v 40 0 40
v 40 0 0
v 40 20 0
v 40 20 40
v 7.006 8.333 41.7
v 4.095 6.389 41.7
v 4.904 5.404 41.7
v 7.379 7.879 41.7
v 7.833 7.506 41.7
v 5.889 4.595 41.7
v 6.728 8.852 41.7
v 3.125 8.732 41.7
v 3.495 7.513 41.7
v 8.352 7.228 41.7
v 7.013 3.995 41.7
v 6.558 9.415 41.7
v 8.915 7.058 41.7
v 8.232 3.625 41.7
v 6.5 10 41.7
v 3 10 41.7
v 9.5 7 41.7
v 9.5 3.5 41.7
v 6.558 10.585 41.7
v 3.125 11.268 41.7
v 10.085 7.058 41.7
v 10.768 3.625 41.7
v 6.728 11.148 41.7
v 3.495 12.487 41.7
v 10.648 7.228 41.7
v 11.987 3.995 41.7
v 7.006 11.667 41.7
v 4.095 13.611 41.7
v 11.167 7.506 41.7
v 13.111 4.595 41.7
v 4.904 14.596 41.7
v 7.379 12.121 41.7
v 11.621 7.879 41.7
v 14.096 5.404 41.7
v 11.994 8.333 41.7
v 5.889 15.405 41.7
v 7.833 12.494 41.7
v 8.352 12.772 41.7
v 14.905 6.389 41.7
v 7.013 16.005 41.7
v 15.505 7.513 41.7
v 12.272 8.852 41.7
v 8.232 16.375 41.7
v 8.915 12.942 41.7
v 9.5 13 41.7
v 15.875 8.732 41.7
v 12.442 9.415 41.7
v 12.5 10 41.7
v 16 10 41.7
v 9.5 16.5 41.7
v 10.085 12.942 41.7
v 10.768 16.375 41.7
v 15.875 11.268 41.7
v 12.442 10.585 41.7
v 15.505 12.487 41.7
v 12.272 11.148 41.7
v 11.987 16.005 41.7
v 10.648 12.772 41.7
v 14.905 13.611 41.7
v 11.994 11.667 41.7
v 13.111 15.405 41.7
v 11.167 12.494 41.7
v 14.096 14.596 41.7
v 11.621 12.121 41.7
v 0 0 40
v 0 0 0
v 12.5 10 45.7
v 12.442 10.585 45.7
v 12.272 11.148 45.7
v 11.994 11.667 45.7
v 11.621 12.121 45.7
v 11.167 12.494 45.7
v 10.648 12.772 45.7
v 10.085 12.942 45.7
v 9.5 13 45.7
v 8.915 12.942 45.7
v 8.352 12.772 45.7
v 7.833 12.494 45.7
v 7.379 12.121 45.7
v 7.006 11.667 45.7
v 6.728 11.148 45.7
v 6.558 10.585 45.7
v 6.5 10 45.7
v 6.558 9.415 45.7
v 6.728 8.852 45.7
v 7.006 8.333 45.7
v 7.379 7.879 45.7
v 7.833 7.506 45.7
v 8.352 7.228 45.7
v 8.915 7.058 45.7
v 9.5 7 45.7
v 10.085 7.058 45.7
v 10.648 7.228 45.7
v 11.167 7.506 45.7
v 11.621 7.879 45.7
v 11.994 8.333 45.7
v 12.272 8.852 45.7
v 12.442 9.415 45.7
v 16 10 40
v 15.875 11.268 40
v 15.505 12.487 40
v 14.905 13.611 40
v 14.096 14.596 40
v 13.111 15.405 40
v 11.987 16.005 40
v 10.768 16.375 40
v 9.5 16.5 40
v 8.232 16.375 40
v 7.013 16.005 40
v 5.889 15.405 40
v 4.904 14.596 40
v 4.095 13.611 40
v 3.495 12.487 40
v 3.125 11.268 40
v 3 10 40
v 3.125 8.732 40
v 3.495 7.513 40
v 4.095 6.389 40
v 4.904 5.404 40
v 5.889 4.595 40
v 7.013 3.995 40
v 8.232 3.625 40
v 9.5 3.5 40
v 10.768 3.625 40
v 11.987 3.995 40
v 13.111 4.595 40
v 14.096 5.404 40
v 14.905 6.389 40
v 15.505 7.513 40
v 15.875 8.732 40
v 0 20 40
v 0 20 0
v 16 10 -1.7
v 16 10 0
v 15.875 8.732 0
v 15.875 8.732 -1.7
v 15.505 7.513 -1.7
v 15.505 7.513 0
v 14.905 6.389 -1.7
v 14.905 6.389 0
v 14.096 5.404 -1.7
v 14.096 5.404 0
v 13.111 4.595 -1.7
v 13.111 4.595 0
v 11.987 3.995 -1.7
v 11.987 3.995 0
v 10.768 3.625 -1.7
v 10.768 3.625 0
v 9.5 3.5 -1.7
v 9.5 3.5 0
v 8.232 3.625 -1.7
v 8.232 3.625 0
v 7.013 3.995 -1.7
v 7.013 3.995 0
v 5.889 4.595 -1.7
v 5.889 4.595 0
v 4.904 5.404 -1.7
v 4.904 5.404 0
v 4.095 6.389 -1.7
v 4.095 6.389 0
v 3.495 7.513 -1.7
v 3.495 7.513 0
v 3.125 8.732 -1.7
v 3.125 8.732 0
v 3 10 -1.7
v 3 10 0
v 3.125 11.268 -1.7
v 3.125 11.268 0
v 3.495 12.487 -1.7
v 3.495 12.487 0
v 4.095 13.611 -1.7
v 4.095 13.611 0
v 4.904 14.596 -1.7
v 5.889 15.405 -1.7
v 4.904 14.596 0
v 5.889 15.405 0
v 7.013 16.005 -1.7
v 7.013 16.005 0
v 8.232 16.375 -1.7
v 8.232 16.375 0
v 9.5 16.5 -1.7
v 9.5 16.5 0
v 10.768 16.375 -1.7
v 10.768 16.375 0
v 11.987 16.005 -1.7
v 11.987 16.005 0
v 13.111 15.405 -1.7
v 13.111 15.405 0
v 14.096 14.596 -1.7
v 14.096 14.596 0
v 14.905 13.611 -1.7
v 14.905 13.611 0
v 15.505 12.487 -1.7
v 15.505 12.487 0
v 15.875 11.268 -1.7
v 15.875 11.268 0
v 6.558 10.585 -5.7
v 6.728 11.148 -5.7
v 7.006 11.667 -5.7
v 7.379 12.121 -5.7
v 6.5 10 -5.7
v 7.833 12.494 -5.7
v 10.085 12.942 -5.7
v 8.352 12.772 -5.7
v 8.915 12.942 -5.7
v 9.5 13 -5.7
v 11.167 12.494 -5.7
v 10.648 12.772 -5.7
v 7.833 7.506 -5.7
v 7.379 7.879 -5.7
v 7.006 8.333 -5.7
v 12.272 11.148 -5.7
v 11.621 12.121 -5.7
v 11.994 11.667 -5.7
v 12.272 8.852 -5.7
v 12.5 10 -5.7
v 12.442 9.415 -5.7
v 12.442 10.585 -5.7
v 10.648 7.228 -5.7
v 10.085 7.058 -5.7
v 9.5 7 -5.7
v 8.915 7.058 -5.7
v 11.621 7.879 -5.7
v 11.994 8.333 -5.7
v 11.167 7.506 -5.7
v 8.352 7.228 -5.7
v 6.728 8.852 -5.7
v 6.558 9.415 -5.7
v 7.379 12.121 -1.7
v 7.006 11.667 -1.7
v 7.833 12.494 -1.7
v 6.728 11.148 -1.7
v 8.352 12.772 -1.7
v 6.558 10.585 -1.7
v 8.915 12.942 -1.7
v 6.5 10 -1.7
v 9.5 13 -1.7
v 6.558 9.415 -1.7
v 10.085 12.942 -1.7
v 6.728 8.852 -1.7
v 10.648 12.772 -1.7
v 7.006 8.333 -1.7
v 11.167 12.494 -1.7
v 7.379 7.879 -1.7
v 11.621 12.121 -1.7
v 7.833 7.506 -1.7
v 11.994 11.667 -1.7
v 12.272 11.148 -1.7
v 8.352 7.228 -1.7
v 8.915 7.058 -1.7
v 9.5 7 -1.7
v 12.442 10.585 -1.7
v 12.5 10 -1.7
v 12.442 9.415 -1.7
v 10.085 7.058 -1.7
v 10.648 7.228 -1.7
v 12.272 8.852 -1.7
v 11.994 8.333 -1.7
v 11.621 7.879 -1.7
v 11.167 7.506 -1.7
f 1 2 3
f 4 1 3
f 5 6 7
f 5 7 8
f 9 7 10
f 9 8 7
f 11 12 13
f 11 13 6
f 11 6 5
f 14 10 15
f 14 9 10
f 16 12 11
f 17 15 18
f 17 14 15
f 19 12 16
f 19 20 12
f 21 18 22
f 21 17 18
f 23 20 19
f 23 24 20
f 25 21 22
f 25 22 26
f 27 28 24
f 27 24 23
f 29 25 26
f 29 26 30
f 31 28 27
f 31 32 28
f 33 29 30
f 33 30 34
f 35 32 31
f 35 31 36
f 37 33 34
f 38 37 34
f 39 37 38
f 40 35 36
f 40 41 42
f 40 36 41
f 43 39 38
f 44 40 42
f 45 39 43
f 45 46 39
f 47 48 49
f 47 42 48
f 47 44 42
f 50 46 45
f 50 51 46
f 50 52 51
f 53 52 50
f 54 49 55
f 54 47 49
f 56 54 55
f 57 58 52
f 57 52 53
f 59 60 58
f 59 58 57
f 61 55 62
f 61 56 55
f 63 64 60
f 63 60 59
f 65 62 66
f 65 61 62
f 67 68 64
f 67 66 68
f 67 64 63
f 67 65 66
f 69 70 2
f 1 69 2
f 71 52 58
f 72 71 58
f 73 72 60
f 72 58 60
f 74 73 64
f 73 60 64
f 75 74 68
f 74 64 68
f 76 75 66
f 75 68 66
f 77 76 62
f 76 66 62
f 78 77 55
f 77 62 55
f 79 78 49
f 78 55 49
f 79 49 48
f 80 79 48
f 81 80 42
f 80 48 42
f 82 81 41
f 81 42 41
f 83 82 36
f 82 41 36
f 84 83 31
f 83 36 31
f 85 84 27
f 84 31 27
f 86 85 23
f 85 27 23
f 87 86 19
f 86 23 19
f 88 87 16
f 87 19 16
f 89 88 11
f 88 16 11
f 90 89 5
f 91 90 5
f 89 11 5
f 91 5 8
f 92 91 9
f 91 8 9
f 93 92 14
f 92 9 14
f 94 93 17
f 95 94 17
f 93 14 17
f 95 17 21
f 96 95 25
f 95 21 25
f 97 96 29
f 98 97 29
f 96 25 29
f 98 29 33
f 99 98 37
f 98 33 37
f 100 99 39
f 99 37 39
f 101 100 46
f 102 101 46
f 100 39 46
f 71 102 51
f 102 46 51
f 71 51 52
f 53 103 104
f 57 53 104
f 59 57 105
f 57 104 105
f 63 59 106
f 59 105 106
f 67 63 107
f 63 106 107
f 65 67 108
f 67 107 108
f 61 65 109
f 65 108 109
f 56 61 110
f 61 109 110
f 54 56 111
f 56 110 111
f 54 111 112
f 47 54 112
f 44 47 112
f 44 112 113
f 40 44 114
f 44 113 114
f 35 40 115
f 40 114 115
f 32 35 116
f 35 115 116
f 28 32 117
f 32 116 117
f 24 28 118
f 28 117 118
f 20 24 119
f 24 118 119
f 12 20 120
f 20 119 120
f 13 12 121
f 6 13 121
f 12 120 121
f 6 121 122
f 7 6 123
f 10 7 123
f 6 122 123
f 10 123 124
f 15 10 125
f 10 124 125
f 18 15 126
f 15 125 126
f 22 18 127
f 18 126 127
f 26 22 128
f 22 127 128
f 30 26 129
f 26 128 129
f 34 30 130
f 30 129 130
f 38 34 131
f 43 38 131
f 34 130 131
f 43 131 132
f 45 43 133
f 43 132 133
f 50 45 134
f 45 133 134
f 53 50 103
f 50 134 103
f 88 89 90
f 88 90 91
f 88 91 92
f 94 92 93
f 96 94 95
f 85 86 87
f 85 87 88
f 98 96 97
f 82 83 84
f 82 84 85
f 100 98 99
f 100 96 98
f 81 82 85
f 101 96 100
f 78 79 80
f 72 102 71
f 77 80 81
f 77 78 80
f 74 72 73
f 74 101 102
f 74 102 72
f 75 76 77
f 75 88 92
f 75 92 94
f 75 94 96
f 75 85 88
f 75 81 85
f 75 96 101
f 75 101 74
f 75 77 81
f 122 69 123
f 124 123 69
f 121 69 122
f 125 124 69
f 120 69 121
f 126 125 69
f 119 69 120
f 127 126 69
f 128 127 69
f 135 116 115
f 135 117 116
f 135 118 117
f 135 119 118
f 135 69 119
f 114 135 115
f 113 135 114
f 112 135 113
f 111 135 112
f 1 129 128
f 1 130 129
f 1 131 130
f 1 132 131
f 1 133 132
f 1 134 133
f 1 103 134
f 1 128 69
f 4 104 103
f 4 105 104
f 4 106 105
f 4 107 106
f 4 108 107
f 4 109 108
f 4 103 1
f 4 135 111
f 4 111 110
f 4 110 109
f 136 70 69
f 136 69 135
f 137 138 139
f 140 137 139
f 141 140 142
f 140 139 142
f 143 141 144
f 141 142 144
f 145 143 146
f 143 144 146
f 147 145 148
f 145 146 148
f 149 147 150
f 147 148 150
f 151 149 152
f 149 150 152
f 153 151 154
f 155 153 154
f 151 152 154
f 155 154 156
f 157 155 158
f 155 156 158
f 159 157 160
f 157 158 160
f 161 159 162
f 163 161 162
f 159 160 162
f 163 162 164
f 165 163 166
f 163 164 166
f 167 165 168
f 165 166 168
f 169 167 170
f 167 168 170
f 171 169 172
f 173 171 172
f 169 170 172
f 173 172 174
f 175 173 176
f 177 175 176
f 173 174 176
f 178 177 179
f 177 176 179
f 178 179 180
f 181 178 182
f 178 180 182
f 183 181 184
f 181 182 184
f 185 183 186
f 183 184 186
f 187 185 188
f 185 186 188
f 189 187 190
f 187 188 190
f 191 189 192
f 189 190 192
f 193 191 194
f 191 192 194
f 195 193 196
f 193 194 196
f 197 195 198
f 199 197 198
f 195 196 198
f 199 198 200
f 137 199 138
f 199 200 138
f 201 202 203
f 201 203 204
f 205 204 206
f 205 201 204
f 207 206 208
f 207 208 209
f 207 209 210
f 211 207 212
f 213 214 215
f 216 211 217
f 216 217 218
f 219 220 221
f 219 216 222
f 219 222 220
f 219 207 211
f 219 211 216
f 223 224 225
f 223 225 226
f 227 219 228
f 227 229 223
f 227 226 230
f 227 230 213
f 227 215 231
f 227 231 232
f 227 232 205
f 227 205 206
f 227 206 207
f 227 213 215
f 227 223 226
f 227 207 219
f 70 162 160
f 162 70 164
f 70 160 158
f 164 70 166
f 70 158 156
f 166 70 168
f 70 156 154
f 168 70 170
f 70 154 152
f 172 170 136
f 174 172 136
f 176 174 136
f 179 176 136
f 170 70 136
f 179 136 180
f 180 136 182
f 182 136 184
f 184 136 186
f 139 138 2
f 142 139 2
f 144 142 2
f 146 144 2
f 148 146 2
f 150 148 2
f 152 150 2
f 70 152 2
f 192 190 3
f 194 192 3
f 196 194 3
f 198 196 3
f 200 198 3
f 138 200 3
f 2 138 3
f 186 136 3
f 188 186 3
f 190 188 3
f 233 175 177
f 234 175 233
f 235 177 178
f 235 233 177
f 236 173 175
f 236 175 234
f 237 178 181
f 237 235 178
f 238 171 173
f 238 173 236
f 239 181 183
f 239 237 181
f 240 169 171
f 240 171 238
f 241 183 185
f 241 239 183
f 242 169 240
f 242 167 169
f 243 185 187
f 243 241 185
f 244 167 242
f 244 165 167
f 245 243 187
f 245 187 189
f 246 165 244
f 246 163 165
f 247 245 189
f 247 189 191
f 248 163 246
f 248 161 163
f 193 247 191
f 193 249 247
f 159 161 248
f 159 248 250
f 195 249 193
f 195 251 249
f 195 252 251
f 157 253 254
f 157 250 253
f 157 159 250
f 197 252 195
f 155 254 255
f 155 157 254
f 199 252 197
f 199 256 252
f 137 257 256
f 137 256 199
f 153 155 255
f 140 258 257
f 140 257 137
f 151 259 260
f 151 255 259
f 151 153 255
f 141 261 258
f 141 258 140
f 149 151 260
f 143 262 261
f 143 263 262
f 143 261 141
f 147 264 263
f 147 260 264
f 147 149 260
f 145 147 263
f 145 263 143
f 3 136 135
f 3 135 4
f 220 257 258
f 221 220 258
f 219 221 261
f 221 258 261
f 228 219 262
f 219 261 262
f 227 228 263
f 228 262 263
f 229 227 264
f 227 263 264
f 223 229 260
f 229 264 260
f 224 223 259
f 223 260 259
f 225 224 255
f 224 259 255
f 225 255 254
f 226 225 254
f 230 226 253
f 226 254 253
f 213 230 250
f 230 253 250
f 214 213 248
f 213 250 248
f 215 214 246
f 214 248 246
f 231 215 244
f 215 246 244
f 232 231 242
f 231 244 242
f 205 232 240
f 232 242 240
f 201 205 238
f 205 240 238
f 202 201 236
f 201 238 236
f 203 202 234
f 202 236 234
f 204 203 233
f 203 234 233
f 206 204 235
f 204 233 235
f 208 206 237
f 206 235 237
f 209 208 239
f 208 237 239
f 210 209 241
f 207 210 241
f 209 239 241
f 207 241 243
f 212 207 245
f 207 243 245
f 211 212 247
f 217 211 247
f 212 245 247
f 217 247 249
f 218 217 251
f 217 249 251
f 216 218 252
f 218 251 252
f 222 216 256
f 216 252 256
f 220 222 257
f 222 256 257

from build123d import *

# Parameters (mm, degrees)
F0_W     = 40
F0_H     = 20
F1_DEPTH = 40
F2_R     = 6.5
F3_DEPTH = 1.7
F4_R     = 3
F5_DEPTH = 4
F6_R     = 6.5
F7_DEPTH = 1.7
F8_R     = 3
F9_DEPTH = 4


with BuildPart() as f1:
    # F0 (on Top) → F1 (new body)
    with BuildSketch(Plane.XY):
        with Locations((20, 10)):
            Rectangle(F0_W, F0_H)
    extrude(amount=F1_DEPTH)

    # F2 (on face) → F3 (join)
    with BuildSketch(Plane.XY.offset(40)):
        with Locations((9.5, 10)):
            Circle(F2_R)
    extrude(amount=F3_DEPTH)

    # F4 (on face) → F5 (join)
    with BuildSketch(Plane.XY.offset(41.7)):
        with Locations((9.5, 10)):
            Circle(F4_R)
    extrude(amount=F5_DEPTH)

    # F6 (on face) → F7 (join)
    with BuildSketch(Plane(origin=(0, 0, 0), x_dir=(1, 0, 0), z_dir=(0, 0, -1))):
        with Locations((9.5, -10)):
            Circle(F6_R)
    extrude(amount=F7_DEPTH)

    # F8 (on face) → F9 (join)
    with BuildSketch(Plane(origin=(0, 0, -1.7), x_dir=(1, 0, 0), z_dir=(0, 0, -1))):
        with Locations((9.5, -10)):
            Circle(F8_R)
    extrude(amount=F9_DEPTH)


solid = f1.part
